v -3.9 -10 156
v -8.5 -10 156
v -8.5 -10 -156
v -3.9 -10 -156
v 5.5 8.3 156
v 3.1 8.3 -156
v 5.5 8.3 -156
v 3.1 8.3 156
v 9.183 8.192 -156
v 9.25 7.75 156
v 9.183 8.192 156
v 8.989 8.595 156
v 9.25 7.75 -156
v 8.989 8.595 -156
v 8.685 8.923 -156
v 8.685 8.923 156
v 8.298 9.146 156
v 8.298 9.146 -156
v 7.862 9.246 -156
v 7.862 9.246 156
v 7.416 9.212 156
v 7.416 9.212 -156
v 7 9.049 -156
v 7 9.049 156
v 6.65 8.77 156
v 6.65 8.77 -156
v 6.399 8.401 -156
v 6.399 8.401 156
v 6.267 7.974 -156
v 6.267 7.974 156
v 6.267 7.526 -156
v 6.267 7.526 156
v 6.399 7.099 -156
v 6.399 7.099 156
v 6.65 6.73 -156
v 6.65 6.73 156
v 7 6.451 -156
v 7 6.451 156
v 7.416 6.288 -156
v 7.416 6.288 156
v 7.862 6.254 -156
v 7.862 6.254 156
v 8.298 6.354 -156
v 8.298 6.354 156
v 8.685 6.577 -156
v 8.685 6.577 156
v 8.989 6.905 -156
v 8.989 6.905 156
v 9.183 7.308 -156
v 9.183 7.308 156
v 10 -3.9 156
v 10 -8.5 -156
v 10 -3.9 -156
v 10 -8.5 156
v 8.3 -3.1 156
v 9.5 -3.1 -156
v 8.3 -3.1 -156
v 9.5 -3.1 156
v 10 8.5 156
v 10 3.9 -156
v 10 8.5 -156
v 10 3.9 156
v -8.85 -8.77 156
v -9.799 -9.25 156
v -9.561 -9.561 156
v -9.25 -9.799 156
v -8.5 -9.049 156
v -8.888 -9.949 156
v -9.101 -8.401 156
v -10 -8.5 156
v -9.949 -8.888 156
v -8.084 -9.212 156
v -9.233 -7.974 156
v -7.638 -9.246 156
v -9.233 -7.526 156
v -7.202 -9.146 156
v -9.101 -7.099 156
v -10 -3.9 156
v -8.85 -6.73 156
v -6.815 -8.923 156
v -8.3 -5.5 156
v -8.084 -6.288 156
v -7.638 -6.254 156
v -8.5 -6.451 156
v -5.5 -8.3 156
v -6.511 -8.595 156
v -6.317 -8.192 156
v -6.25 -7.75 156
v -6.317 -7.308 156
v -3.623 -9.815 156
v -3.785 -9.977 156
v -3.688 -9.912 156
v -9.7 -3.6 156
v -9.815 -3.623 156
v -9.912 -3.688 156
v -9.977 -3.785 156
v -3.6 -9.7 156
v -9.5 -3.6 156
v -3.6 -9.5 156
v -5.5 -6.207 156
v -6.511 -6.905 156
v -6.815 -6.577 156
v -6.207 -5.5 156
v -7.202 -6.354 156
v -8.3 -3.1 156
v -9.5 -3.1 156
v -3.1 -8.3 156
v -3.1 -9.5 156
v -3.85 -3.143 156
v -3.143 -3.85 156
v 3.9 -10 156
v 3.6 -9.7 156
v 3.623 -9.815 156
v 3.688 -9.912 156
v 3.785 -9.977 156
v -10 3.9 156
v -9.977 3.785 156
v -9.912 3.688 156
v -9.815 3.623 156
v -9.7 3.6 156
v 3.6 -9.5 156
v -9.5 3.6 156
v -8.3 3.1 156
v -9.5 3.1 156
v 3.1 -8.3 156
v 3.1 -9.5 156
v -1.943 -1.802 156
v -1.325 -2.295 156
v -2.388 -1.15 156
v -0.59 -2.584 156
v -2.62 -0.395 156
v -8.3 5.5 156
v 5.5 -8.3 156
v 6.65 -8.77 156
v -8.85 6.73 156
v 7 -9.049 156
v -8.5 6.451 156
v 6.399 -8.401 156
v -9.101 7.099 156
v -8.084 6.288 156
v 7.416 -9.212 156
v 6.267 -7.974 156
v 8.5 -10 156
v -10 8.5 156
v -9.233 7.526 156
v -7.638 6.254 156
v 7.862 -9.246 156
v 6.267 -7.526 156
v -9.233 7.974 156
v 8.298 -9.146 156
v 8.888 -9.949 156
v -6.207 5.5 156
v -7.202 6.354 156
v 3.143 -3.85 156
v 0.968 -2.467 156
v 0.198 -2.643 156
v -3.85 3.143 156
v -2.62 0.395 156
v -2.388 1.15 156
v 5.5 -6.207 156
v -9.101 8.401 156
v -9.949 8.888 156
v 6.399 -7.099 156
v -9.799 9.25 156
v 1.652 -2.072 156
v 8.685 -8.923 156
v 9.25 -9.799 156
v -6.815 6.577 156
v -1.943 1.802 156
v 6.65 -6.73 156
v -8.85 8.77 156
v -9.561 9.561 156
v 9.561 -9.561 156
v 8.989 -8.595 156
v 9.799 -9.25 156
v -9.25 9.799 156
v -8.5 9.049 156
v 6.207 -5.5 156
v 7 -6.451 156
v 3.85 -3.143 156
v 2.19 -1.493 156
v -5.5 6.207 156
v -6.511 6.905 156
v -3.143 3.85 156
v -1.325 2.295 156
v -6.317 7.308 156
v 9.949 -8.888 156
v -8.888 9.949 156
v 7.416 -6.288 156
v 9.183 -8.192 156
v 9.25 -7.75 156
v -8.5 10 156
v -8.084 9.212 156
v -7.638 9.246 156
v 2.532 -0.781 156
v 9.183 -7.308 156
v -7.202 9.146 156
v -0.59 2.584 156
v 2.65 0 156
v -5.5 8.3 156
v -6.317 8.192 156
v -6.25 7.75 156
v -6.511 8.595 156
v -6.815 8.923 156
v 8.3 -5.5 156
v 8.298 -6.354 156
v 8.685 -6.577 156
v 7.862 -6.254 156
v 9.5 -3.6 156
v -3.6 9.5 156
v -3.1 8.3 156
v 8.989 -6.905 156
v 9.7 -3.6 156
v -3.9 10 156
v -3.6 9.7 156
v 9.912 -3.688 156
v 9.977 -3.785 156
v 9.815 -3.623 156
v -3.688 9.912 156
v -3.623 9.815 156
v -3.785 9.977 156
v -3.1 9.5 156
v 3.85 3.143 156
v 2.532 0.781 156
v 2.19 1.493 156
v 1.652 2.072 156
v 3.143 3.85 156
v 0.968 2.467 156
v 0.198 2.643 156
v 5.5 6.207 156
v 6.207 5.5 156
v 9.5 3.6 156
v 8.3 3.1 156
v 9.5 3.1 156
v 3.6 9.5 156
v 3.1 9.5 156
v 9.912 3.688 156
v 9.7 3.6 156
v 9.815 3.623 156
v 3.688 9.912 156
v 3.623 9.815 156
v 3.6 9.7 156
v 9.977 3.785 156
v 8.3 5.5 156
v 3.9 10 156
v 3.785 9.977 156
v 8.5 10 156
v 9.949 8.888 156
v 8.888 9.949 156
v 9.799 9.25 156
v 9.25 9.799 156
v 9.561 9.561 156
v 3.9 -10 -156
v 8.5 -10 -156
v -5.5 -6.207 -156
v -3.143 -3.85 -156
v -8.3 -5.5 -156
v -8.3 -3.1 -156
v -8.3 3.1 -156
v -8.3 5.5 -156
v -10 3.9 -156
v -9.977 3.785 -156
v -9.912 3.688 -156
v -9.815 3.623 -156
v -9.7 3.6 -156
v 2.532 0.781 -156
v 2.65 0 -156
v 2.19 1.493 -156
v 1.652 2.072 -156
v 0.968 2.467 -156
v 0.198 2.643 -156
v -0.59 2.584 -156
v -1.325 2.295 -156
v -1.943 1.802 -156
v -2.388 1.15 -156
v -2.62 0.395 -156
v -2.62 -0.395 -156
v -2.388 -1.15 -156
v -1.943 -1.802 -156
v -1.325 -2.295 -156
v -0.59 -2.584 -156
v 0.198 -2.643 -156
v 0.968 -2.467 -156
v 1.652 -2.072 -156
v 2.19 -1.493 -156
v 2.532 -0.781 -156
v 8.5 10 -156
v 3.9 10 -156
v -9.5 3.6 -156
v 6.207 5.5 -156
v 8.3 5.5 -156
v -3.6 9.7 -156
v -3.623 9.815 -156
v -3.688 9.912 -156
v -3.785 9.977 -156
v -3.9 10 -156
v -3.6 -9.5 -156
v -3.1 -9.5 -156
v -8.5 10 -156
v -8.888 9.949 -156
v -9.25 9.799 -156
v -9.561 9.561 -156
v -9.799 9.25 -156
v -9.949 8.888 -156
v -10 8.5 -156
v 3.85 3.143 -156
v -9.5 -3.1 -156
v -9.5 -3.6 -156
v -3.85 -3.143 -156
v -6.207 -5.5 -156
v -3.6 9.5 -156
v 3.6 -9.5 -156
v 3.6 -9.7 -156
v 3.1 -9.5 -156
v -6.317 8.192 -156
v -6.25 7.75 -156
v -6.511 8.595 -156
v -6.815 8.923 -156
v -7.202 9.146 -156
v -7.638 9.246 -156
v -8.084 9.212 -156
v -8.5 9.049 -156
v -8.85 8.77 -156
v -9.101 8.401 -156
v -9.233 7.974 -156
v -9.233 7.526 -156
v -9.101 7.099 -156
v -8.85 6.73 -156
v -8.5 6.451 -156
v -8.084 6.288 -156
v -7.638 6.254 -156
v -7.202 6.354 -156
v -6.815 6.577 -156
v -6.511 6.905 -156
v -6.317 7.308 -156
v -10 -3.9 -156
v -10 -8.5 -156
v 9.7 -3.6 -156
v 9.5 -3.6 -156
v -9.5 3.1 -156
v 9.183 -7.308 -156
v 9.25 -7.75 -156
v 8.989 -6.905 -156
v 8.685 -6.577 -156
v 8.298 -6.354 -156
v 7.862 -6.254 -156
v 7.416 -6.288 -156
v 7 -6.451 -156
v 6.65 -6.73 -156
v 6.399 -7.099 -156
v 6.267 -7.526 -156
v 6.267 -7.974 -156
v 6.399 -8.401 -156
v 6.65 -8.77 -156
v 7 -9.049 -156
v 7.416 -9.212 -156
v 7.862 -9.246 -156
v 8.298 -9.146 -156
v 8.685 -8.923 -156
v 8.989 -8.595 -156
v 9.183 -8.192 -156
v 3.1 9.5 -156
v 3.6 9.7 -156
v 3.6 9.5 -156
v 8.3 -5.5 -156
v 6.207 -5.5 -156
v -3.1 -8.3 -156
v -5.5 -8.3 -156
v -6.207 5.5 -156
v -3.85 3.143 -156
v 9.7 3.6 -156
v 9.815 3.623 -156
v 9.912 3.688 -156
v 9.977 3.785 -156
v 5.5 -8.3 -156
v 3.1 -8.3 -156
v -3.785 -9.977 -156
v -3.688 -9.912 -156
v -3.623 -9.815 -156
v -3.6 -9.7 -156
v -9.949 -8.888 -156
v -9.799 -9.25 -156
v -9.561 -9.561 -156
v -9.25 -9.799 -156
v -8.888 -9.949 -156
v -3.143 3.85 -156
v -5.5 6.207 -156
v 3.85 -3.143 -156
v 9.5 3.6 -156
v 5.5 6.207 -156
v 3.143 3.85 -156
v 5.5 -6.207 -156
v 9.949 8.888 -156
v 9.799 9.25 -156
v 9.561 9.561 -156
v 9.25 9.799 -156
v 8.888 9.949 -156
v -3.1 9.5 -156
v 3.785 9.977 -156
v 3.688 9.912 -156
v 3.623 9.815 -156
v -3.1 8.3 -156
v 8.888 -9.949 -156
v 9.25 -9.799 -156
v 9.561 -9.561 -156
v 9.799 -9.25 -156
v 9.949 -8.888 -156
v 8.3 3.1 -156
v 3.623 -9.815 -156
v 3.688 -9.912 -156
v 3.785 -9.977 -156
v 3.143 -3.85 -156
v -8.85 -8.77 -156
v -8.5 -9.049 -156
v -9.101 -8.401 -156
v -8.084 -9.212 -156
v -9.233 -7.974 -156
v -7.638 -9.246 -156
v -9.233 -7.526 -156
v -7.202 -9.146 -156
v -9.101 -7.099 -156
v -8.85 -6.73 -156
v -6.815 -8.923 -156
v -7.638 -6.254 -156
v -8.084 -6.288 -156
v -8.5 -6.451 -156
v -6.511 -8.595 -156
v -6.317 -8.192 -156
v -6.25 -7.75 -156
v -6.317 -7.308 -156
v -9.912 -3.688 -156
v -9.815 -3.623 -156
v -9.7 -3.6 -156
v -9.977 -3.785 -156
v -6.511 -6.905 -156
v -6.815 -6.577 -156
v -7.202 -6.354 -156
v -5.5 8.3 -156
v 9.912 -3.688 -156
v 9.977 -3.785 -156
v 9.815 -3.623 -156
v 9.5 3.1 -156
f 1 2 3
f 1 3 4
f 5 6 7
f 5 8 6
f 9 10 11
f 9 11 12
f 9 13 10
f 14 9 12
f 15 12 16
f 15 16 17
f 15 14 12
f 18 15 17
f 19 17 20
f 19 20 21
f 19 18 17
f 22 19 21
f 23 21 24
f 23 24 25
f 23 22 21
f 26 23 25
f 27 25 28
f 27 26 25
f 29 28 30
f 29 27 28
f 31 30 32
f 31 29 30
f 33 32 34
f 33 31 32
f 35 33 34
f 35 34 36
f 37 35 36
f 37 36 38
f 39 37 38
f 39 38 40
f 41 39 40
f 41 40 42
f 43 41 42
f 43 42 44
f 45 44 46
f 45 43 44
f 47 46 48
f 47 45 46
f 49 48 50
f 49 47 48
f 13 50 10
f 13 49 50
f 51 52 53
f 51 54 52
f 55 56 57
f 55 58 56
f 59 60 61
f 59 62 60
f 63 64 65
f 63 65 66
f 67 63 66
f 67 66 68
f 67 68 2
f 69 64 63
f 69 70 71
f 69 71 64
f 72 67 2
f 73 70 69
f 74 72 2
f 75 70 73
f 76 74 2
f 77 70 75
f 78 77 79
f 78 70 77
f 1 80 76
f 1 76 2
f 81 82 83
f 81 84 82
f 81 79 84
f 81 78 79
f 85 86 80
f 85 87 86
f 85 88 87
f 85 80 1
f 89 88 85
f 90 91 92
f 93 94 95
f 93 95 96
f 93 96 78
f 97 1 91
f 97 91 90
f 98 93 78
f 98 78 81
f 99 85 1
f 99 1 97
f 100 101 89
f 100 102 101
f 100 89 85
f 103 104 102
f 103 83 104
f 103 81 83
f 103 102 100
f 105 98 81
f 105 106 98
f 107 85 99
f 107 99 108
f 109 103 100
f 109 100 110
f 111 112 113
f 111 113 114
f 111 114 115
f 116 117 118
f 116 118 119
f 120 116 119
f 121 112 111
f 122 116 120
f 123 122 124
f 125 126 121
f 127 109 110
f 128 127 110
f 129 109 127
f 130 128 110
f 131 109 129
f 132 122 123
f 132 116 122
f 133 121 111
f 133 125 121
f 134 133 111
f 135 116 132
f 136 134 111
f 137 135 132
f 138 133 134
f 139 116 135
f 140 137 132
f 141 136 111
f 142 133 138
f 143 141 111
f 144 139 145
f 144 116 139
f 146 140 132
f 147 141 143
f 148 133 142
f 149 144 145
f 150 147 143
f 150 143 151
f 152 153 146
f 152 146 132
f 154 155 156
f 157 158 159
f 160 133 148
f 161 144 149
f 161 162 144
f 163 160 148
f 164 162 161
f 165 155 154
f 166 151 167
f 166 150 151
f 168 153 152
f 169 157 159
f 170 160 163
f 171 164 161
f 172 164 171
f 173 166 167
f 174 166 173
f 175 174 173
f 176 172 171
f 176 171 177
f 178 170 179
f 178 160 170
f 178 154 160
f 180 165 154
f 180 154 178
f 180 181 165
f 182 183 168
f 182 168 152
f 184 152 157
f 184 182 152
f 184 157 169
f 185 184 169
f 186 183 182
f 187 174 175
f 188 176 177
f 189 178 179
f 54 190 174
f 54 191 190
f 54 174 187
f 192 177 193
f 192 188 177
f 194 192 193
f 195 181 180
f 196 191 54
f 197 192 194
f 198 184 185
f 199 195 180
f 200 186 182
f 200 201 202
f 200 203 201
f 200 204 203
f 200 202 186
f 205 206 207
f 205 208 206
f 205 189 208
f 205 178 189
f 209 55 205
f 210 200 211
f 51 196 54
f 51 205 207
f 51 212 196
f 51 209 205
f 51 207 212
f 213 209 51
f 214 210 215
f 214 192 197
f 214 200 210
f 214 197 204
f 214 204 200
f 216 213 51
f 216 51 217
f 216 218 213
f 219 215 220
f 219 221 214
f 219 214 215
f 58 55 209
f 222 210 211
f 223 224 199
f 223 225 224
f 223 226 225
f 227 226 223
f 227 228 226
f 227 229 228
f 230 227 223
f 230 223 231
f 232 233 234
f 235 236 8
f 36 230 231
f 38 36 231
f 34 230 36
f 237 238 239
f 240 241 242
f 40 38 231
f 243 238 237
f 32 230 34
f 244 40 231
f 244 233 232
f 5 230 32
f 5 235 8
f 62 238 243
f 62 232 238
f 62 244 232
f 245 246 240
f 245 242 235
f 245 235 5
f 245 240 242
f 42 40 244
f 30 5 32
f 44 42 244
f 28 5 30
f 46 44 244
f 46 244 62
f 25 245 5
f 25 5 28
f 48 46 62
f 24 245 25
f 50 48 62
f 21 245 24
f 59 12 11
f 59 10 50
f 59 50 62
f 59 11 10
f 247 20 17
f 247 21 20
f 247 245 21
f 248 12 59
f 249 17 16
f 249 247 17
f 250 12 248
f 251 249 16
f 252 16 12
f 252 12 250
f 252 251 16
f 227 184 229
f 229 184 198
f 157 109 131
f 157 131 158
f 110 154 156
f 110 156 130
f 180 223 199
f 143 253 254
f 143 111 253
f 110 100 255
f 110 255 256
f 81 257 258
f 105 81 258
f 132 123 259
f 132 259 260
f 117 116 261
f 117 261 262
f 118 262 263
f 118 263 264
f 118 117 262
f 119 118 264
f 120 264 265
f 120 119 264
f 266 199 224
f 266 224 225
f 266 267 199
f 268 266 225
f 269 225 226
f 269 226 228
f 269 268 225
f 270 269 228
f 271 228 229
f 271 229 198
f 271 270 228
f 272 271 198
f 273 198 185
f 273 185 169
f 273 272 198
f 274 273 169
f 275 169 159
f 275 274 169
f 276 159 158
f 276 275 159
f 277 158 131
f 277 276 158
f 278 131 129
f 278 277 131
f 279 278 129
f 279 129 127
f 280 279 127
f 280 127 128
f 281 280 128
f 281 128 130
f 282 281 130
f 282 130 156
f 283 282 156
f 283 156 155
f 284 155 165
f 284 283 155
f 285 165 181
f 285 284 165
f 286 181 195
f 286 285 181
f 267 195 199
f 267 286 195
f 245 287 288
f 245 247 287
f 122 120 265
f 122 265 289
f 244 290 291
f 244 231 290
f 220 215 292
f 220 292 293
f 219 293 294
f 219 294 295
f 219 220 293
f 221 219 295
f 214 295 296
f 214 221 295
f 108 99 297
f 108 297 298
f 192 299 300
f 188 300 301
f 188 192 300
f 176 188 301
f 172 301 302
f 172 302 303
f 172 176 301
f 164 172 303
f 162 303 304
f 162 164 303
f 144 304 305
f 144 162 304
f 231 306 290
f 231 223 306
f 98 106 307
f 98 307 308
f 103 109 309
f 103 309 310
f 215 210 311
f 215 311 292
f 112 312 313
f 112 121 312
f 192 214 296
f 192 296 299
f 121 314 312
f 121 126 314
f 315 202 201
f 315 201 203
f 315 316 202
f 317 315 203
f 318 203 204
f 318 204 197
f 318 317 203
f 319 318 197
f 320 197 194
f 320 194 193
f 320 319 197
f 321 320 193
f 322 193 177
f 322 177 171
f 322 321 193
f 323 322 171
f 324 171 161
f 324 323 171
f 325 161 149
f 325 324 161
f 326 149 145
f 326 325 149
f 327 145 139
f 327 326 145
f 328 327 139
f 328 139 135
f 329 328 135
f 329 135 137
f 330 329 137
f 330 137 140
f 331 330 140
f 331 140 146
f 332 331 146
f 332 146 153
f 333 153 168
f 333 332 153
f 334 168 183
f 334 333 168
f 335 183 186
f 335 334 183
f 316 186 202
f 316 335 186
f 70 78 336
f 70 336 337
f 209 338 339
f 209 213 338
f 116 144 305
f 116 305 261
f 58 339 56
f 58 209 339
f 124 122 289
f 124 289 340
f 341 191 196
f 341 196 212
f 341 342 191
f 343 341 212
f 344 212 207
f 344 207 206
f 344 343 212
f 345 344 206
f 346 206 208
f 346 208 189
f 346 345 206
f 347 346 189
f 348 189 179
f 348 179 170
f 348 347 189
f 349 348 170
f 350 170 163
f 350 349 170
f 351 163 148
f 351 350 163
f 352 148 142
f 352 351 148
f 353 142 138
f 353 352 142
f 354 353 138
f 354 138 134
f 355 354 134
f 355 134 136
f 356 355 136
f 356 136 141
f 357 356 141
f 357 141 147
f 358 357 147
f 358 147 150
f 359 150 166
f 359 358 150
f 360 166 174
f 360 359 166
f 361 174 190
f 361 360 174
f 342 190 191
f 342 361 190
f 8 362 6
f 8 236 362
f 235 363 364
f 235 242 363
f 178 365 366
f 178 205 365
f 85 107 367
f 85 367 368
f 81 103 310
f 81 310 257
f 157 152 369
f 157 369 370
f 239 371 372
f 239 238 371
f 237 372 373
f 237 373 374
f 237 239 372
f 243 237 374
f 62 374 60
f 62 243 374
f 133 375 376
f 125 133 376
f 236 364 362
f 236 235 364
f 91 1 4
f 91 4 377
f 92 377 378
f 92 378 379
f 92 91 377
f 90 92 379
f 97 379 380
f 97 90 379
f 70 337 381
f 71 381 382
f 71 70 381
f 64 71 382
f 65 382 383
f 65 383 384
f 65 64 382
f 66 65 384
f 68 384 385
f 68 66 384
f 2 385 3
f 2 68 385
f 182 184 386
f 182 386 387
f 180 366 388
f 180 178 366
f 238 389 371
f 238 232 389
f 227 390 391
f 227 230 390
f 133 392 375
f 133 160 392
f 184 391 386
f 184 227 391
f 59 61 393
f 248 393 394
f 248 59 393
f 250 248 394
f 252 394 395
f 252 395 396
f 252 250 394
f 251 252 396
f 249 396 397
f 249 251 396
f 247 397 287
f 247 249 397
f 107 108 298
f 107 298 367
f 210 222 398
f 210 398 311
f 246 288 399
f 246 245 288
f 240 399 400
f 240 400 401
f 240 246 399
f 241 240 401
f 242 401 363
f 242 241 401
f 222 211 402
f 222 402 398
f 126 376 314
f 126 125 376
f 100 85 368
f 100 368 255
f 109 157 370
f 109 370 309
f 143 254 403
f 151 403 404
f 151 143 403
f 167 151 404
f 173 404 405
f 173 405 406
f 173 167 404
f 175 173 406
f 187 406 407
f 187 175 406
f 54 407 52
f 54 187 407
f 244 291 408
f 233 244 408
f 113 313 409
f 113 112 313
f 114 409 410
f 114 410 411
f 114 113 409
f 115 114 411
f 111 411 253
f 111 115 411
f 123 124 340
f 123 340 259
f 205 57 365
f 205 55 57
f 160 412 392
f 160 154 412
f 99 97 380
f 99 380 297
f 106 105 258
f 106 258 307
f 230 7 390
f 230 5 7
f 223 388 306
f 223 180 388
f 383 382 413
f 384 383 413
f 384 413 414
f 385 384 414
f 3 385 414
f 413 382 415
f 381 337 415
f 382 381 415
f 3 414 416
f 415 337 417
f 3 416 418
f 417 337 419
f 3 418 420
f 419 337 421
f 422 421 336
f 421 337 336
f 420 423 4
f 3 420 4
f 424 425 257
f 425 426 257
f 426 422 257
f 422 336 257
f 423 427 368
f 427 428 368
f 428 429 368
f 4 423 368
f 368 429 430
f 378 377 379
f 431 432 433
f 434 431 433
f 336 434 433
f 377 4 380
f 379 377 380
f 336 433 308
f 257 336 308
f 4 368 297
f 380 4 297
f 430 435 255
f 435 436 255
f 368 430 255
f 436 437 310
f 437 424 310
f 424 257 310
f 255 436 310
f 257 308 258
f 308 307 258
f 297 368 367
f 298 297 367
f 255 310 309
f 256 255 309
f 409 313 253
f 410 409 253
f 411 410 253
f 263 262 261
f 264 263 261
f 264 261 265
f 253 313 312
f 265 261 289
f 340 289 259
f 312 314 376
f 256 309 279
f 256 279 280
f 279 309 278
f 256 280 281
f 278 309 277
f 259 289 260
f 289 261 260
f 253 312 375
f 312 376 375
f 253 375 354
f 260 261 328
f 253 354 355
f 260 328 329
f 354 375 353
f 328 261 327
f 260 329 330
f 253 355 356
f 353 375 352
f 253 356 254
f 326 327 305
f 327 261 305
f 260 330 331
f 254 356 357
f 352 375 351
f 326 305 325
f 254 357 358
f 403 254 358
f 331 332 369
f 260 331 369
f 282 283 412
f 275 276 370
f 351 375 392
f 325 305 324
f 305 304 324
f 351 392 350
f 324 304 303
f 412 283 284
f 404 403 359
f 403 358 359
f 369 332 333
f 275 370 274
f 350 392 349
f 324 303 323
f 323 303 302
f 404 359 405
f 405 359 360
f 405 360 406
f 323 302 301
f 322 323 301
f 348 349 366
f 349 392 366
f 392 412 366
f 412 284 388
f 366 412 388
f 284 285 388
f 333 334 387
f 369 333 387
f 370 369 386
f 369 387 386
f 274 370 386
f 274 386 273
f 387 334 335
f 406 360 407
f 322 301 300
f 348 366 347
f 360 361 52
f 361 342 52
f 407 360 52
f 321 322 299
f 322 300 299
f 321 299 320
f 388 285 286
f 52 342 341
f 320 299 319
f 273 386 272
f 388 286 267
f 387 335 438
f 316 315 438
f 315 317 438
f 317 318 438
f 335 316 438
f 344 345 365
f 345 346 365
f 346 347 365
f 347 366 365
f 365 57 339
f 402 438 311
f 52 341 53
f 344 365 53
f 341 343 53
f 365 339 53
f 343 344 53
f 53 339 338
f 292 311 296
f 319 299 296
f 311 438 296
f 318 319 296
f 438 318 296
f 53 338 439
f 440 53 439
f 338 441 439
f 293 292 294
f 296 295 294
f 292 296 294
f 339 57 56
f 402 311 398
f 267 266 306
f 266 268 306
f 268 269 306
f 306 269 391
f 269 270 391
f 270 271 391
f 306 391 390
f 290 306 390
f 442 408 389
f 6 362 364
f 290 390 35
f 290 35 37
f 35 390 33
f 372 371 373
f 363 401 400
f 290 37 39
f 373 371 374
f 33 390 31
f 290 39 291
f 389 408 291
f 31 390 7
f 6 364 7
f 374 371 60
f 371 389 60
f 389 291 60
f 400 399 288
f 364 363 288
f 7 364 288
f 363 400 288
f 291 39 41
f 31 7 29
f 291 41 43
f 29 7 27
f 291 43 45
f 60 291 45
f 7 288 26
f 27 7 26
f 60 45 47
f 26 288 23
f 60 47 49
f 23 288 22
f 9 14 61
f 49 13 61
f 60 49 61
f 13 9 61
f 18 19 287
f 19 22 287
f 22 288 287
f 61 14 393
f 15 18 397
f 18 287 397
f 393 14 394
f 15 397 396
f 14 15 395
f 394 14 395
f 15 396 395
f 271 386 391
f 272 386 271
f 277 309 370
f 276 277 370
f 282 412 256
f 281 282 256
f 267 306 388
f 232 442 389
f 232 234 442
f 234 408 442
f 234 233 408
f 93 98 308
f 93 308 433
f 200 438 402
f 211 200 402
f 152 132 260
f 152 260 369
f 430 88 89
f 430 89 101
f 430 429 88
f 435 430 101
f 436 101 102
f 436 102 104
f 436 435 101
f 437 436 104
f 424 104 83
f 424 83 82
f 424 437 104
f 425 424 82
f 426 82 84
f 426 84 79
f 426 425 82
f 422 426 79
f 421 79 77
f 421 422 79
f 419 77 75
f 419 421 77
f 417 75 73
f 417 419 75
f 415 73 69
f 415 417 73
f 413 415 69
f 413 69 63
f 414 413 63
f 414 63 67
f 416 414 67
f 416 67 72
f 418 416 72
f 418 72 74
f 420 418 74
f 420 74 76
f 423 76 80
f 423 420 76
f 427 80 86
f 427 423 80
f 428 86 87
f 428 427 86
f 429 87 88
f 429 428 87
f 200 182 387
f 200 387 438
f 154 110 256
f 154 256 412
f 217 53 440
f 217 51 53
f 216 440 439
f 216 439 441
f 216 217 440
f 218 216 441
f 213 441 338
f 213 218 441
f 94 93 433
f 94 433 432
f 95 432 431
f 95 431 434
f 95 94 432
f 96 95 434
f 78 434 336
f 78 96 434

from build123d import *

# Parameters (mm, degrees)
SKETCH_1_R      = 2.65
SKETCH_1_R_2    = 1.5
EXTRUDE_1_DEPTH = 156


with BuildPart() as part:
    # 草图1 → 凸台-拉伸1 (new, symmetric)
    with BuildSketch(Plane.XY):
        with BuildLine():
            Line((3.142893219, 3.85), (-3.142893219, 3.85))
            Line((-3.142893219, 3.85), (-5.5, 6.207106781))
            Line((-5.5, 6.207106781), (-5.5, 8.3))
            Line((-5.5, 8.3), (-3.1, 8.3))
            Line((-3.1, 8.3), (-3.1, 9.5))
            Line((-3.1, 9.5), (-3.6, 9.5))
            Line((-3.6, 9.5), (-3.6, 9.7))
            ThreePointArc((-3.6, 9.7), (-3.687867966, 9.912132034), (-3.9, 10))
            Line((-3.9, 10), (-8.5, 10))
            ThreePointArc((-8.5, 10), (-9.560660172, 9.560660172), (-10, 8.5))
            Line((-10, 8.5), (-10, 3.9))
            ThreePointArc((-10, 3.9), (-9.912132034, 3.687867966), (-9.7, 3.6))
            Line((-9.7, 3.6), (-9.5, 3.6))
            Line((-9.5, 3.6), (-9.5, 3.1))
            Line((-9.5, 3.1), (-8.3, 3.1))
            Line((-8.3, 3.1), (-8.3, 5.5))
            Line((-8.3, 5.5), (-6.207106781, 5.5))
            Line((-6.207106781, 5.5), (-3.85, 3.142893219))
            Line((-3.85, 3.142893219), (-3.85, -3.142893219))
            Line((-3.85, -3.142893219), (-6.207106781, -5.5))
            Line((-6.207106781, -5.5), (-8.3, -5.5))
            Line((-8.3, -5.5), (-8.3, -3.1))
            Line((-8.3, -3.1), (-9.5, -3.1))
            Line((-9.5, -3.1), (-9.5, -3.6))
            Line((-9.5, -3.6), (-9.7, -3.6))
            ThreePointArc((-9.7, -3.6), (-9.912132034, -3.687867966), (-10, -3.9))
            Line((-10, -3.9), (-10, -8.5))
            ThreePointArc((-10, -8.5), (-9.560660172, -9.560660172), (-8.5, -10))
            Line((-8.5, -10), (-3.9, -10))
            ThreePointArc((-3.9, -10), (-3.687867966, -9.912132034), (-3.6, -9.7))
            Line((-3.6, -9.7), (-3.6, -9.5))
            Line((-3.6, -9.5), (-3.1, -9.5))
            Line((-3.1, -9.5), (-3.1, -8.3))
            Line((-3.1, -8.3), (-5.5, -8.3))
            Line((-5.5, -8.3), (-5.5, -6.207106781))
            Line((-5.5, -6.207106781), (-3.142893219, -3.85))
            Line((-3.142893219, -3.85), (3.142893219, -3.85))
            Line((3.142893219, -3.85), (5.5, -6.207106781))
            Line((5.5, -6.207106781), (5.5, -8.3))
            Line((5.5, -8.3), (3.1, -8.3))
            Line((3.1, -8.3), (3.1, -9.5))
            Line((3.1, -9.5), (3.6, -9.5))
            Line((3.6, -9.5), (3.6, -9.7))
            ThreePointArc((3.6, -9.7), (3.687867966, -9.912132034), (3.9, -10))
            Line((3.9, -10), (8.5, -10))
            ThreePointArc((8.5, -10), (9.560660172, -9.560660172), (10, -8.5))
            Line((10, -8.5), (10, -3.9))
            ThreePointArc((10, -3.9), (9.912132034, -3.687867966), (9.7, -3.6))
            Line((9.7, -3.6), (9.5, -3.6))
            Line((9.5, -3.6), (9.5, -3.1))
            Line((9.5, -3.1), (8.3, -3.1))
            Line((8.3, -3.1), (8.3, -5.5))
            Line((8.3, -5.5), (6.207106781, -5.5))
            Line((6.207106781, -5.5), (3.85, -3.142893219))
            Line((3.85, -3.142893219), (3.85, 3.142893219))
            Line((3.85, 3.142893219), (6.207106781, 5.5))
            Line((6.207106781, 5.5), (8.3, 5.5))
            Line((8.3, 5.5), (8.3, 3.1))
            Line((8.3, 3.1), (9.5, 3.1))
            Line((9.5, 3.1), (9.5, 3.6))
            Line((9.5, 3.6), (9.7, 3.6))
            ThreePointArc((9.7, 3.6), (9.912132034, 3.687867966), (10, 3.9))
            Line((10, 3.9), (10, 8.5))
            ThreePointArc((10, 8.5), (9.560660172, 9.560660172), (8.5, 10))
            Line((8.5, 10), (3.9, 10))
            ThreePointArc((3.9, 10), (3.687867966, 9.912132034), (3.6, 9.7))
            Line((3.6, 9.7), (3.6, 9.5))
            Line((3.6, 9.5), (3.1, 9.5))
            Line((3.1, 9.5), (3.1, 8.3))
            Line((3.1, 8.3), (5.5, 8.3))
            Line((5.5, 8.3), (5.5, 6.207106781))
            Line((5.5, 6.207106781), (3.142893219, 3.85))
        make_face()
        Circle(SKETCH_1_R, mode=Mode.SUBTRACT)
        with Locations((-7.75, 7.75)):
            Circle(SKETCH_1_R_2, mode=Mode.SUBTRACT)
        with Locations((7.75, 7.75)):
            Circle(SKETCH_1_R_2, mode=Mode.SUBTRACT)
        with Locations((7.75, -7.75)):
            Circle(SKETCH_1_R_2, mode=Mode.SUBTRACT)
        with Locations((-7.75, -7.75)):
            Circle(SKETCH_1_R_2, mode=Mode.SUBTRACT)
    extrude(amount=EXTRUDE_1_DEPTH, both=True)


solid = part.part
